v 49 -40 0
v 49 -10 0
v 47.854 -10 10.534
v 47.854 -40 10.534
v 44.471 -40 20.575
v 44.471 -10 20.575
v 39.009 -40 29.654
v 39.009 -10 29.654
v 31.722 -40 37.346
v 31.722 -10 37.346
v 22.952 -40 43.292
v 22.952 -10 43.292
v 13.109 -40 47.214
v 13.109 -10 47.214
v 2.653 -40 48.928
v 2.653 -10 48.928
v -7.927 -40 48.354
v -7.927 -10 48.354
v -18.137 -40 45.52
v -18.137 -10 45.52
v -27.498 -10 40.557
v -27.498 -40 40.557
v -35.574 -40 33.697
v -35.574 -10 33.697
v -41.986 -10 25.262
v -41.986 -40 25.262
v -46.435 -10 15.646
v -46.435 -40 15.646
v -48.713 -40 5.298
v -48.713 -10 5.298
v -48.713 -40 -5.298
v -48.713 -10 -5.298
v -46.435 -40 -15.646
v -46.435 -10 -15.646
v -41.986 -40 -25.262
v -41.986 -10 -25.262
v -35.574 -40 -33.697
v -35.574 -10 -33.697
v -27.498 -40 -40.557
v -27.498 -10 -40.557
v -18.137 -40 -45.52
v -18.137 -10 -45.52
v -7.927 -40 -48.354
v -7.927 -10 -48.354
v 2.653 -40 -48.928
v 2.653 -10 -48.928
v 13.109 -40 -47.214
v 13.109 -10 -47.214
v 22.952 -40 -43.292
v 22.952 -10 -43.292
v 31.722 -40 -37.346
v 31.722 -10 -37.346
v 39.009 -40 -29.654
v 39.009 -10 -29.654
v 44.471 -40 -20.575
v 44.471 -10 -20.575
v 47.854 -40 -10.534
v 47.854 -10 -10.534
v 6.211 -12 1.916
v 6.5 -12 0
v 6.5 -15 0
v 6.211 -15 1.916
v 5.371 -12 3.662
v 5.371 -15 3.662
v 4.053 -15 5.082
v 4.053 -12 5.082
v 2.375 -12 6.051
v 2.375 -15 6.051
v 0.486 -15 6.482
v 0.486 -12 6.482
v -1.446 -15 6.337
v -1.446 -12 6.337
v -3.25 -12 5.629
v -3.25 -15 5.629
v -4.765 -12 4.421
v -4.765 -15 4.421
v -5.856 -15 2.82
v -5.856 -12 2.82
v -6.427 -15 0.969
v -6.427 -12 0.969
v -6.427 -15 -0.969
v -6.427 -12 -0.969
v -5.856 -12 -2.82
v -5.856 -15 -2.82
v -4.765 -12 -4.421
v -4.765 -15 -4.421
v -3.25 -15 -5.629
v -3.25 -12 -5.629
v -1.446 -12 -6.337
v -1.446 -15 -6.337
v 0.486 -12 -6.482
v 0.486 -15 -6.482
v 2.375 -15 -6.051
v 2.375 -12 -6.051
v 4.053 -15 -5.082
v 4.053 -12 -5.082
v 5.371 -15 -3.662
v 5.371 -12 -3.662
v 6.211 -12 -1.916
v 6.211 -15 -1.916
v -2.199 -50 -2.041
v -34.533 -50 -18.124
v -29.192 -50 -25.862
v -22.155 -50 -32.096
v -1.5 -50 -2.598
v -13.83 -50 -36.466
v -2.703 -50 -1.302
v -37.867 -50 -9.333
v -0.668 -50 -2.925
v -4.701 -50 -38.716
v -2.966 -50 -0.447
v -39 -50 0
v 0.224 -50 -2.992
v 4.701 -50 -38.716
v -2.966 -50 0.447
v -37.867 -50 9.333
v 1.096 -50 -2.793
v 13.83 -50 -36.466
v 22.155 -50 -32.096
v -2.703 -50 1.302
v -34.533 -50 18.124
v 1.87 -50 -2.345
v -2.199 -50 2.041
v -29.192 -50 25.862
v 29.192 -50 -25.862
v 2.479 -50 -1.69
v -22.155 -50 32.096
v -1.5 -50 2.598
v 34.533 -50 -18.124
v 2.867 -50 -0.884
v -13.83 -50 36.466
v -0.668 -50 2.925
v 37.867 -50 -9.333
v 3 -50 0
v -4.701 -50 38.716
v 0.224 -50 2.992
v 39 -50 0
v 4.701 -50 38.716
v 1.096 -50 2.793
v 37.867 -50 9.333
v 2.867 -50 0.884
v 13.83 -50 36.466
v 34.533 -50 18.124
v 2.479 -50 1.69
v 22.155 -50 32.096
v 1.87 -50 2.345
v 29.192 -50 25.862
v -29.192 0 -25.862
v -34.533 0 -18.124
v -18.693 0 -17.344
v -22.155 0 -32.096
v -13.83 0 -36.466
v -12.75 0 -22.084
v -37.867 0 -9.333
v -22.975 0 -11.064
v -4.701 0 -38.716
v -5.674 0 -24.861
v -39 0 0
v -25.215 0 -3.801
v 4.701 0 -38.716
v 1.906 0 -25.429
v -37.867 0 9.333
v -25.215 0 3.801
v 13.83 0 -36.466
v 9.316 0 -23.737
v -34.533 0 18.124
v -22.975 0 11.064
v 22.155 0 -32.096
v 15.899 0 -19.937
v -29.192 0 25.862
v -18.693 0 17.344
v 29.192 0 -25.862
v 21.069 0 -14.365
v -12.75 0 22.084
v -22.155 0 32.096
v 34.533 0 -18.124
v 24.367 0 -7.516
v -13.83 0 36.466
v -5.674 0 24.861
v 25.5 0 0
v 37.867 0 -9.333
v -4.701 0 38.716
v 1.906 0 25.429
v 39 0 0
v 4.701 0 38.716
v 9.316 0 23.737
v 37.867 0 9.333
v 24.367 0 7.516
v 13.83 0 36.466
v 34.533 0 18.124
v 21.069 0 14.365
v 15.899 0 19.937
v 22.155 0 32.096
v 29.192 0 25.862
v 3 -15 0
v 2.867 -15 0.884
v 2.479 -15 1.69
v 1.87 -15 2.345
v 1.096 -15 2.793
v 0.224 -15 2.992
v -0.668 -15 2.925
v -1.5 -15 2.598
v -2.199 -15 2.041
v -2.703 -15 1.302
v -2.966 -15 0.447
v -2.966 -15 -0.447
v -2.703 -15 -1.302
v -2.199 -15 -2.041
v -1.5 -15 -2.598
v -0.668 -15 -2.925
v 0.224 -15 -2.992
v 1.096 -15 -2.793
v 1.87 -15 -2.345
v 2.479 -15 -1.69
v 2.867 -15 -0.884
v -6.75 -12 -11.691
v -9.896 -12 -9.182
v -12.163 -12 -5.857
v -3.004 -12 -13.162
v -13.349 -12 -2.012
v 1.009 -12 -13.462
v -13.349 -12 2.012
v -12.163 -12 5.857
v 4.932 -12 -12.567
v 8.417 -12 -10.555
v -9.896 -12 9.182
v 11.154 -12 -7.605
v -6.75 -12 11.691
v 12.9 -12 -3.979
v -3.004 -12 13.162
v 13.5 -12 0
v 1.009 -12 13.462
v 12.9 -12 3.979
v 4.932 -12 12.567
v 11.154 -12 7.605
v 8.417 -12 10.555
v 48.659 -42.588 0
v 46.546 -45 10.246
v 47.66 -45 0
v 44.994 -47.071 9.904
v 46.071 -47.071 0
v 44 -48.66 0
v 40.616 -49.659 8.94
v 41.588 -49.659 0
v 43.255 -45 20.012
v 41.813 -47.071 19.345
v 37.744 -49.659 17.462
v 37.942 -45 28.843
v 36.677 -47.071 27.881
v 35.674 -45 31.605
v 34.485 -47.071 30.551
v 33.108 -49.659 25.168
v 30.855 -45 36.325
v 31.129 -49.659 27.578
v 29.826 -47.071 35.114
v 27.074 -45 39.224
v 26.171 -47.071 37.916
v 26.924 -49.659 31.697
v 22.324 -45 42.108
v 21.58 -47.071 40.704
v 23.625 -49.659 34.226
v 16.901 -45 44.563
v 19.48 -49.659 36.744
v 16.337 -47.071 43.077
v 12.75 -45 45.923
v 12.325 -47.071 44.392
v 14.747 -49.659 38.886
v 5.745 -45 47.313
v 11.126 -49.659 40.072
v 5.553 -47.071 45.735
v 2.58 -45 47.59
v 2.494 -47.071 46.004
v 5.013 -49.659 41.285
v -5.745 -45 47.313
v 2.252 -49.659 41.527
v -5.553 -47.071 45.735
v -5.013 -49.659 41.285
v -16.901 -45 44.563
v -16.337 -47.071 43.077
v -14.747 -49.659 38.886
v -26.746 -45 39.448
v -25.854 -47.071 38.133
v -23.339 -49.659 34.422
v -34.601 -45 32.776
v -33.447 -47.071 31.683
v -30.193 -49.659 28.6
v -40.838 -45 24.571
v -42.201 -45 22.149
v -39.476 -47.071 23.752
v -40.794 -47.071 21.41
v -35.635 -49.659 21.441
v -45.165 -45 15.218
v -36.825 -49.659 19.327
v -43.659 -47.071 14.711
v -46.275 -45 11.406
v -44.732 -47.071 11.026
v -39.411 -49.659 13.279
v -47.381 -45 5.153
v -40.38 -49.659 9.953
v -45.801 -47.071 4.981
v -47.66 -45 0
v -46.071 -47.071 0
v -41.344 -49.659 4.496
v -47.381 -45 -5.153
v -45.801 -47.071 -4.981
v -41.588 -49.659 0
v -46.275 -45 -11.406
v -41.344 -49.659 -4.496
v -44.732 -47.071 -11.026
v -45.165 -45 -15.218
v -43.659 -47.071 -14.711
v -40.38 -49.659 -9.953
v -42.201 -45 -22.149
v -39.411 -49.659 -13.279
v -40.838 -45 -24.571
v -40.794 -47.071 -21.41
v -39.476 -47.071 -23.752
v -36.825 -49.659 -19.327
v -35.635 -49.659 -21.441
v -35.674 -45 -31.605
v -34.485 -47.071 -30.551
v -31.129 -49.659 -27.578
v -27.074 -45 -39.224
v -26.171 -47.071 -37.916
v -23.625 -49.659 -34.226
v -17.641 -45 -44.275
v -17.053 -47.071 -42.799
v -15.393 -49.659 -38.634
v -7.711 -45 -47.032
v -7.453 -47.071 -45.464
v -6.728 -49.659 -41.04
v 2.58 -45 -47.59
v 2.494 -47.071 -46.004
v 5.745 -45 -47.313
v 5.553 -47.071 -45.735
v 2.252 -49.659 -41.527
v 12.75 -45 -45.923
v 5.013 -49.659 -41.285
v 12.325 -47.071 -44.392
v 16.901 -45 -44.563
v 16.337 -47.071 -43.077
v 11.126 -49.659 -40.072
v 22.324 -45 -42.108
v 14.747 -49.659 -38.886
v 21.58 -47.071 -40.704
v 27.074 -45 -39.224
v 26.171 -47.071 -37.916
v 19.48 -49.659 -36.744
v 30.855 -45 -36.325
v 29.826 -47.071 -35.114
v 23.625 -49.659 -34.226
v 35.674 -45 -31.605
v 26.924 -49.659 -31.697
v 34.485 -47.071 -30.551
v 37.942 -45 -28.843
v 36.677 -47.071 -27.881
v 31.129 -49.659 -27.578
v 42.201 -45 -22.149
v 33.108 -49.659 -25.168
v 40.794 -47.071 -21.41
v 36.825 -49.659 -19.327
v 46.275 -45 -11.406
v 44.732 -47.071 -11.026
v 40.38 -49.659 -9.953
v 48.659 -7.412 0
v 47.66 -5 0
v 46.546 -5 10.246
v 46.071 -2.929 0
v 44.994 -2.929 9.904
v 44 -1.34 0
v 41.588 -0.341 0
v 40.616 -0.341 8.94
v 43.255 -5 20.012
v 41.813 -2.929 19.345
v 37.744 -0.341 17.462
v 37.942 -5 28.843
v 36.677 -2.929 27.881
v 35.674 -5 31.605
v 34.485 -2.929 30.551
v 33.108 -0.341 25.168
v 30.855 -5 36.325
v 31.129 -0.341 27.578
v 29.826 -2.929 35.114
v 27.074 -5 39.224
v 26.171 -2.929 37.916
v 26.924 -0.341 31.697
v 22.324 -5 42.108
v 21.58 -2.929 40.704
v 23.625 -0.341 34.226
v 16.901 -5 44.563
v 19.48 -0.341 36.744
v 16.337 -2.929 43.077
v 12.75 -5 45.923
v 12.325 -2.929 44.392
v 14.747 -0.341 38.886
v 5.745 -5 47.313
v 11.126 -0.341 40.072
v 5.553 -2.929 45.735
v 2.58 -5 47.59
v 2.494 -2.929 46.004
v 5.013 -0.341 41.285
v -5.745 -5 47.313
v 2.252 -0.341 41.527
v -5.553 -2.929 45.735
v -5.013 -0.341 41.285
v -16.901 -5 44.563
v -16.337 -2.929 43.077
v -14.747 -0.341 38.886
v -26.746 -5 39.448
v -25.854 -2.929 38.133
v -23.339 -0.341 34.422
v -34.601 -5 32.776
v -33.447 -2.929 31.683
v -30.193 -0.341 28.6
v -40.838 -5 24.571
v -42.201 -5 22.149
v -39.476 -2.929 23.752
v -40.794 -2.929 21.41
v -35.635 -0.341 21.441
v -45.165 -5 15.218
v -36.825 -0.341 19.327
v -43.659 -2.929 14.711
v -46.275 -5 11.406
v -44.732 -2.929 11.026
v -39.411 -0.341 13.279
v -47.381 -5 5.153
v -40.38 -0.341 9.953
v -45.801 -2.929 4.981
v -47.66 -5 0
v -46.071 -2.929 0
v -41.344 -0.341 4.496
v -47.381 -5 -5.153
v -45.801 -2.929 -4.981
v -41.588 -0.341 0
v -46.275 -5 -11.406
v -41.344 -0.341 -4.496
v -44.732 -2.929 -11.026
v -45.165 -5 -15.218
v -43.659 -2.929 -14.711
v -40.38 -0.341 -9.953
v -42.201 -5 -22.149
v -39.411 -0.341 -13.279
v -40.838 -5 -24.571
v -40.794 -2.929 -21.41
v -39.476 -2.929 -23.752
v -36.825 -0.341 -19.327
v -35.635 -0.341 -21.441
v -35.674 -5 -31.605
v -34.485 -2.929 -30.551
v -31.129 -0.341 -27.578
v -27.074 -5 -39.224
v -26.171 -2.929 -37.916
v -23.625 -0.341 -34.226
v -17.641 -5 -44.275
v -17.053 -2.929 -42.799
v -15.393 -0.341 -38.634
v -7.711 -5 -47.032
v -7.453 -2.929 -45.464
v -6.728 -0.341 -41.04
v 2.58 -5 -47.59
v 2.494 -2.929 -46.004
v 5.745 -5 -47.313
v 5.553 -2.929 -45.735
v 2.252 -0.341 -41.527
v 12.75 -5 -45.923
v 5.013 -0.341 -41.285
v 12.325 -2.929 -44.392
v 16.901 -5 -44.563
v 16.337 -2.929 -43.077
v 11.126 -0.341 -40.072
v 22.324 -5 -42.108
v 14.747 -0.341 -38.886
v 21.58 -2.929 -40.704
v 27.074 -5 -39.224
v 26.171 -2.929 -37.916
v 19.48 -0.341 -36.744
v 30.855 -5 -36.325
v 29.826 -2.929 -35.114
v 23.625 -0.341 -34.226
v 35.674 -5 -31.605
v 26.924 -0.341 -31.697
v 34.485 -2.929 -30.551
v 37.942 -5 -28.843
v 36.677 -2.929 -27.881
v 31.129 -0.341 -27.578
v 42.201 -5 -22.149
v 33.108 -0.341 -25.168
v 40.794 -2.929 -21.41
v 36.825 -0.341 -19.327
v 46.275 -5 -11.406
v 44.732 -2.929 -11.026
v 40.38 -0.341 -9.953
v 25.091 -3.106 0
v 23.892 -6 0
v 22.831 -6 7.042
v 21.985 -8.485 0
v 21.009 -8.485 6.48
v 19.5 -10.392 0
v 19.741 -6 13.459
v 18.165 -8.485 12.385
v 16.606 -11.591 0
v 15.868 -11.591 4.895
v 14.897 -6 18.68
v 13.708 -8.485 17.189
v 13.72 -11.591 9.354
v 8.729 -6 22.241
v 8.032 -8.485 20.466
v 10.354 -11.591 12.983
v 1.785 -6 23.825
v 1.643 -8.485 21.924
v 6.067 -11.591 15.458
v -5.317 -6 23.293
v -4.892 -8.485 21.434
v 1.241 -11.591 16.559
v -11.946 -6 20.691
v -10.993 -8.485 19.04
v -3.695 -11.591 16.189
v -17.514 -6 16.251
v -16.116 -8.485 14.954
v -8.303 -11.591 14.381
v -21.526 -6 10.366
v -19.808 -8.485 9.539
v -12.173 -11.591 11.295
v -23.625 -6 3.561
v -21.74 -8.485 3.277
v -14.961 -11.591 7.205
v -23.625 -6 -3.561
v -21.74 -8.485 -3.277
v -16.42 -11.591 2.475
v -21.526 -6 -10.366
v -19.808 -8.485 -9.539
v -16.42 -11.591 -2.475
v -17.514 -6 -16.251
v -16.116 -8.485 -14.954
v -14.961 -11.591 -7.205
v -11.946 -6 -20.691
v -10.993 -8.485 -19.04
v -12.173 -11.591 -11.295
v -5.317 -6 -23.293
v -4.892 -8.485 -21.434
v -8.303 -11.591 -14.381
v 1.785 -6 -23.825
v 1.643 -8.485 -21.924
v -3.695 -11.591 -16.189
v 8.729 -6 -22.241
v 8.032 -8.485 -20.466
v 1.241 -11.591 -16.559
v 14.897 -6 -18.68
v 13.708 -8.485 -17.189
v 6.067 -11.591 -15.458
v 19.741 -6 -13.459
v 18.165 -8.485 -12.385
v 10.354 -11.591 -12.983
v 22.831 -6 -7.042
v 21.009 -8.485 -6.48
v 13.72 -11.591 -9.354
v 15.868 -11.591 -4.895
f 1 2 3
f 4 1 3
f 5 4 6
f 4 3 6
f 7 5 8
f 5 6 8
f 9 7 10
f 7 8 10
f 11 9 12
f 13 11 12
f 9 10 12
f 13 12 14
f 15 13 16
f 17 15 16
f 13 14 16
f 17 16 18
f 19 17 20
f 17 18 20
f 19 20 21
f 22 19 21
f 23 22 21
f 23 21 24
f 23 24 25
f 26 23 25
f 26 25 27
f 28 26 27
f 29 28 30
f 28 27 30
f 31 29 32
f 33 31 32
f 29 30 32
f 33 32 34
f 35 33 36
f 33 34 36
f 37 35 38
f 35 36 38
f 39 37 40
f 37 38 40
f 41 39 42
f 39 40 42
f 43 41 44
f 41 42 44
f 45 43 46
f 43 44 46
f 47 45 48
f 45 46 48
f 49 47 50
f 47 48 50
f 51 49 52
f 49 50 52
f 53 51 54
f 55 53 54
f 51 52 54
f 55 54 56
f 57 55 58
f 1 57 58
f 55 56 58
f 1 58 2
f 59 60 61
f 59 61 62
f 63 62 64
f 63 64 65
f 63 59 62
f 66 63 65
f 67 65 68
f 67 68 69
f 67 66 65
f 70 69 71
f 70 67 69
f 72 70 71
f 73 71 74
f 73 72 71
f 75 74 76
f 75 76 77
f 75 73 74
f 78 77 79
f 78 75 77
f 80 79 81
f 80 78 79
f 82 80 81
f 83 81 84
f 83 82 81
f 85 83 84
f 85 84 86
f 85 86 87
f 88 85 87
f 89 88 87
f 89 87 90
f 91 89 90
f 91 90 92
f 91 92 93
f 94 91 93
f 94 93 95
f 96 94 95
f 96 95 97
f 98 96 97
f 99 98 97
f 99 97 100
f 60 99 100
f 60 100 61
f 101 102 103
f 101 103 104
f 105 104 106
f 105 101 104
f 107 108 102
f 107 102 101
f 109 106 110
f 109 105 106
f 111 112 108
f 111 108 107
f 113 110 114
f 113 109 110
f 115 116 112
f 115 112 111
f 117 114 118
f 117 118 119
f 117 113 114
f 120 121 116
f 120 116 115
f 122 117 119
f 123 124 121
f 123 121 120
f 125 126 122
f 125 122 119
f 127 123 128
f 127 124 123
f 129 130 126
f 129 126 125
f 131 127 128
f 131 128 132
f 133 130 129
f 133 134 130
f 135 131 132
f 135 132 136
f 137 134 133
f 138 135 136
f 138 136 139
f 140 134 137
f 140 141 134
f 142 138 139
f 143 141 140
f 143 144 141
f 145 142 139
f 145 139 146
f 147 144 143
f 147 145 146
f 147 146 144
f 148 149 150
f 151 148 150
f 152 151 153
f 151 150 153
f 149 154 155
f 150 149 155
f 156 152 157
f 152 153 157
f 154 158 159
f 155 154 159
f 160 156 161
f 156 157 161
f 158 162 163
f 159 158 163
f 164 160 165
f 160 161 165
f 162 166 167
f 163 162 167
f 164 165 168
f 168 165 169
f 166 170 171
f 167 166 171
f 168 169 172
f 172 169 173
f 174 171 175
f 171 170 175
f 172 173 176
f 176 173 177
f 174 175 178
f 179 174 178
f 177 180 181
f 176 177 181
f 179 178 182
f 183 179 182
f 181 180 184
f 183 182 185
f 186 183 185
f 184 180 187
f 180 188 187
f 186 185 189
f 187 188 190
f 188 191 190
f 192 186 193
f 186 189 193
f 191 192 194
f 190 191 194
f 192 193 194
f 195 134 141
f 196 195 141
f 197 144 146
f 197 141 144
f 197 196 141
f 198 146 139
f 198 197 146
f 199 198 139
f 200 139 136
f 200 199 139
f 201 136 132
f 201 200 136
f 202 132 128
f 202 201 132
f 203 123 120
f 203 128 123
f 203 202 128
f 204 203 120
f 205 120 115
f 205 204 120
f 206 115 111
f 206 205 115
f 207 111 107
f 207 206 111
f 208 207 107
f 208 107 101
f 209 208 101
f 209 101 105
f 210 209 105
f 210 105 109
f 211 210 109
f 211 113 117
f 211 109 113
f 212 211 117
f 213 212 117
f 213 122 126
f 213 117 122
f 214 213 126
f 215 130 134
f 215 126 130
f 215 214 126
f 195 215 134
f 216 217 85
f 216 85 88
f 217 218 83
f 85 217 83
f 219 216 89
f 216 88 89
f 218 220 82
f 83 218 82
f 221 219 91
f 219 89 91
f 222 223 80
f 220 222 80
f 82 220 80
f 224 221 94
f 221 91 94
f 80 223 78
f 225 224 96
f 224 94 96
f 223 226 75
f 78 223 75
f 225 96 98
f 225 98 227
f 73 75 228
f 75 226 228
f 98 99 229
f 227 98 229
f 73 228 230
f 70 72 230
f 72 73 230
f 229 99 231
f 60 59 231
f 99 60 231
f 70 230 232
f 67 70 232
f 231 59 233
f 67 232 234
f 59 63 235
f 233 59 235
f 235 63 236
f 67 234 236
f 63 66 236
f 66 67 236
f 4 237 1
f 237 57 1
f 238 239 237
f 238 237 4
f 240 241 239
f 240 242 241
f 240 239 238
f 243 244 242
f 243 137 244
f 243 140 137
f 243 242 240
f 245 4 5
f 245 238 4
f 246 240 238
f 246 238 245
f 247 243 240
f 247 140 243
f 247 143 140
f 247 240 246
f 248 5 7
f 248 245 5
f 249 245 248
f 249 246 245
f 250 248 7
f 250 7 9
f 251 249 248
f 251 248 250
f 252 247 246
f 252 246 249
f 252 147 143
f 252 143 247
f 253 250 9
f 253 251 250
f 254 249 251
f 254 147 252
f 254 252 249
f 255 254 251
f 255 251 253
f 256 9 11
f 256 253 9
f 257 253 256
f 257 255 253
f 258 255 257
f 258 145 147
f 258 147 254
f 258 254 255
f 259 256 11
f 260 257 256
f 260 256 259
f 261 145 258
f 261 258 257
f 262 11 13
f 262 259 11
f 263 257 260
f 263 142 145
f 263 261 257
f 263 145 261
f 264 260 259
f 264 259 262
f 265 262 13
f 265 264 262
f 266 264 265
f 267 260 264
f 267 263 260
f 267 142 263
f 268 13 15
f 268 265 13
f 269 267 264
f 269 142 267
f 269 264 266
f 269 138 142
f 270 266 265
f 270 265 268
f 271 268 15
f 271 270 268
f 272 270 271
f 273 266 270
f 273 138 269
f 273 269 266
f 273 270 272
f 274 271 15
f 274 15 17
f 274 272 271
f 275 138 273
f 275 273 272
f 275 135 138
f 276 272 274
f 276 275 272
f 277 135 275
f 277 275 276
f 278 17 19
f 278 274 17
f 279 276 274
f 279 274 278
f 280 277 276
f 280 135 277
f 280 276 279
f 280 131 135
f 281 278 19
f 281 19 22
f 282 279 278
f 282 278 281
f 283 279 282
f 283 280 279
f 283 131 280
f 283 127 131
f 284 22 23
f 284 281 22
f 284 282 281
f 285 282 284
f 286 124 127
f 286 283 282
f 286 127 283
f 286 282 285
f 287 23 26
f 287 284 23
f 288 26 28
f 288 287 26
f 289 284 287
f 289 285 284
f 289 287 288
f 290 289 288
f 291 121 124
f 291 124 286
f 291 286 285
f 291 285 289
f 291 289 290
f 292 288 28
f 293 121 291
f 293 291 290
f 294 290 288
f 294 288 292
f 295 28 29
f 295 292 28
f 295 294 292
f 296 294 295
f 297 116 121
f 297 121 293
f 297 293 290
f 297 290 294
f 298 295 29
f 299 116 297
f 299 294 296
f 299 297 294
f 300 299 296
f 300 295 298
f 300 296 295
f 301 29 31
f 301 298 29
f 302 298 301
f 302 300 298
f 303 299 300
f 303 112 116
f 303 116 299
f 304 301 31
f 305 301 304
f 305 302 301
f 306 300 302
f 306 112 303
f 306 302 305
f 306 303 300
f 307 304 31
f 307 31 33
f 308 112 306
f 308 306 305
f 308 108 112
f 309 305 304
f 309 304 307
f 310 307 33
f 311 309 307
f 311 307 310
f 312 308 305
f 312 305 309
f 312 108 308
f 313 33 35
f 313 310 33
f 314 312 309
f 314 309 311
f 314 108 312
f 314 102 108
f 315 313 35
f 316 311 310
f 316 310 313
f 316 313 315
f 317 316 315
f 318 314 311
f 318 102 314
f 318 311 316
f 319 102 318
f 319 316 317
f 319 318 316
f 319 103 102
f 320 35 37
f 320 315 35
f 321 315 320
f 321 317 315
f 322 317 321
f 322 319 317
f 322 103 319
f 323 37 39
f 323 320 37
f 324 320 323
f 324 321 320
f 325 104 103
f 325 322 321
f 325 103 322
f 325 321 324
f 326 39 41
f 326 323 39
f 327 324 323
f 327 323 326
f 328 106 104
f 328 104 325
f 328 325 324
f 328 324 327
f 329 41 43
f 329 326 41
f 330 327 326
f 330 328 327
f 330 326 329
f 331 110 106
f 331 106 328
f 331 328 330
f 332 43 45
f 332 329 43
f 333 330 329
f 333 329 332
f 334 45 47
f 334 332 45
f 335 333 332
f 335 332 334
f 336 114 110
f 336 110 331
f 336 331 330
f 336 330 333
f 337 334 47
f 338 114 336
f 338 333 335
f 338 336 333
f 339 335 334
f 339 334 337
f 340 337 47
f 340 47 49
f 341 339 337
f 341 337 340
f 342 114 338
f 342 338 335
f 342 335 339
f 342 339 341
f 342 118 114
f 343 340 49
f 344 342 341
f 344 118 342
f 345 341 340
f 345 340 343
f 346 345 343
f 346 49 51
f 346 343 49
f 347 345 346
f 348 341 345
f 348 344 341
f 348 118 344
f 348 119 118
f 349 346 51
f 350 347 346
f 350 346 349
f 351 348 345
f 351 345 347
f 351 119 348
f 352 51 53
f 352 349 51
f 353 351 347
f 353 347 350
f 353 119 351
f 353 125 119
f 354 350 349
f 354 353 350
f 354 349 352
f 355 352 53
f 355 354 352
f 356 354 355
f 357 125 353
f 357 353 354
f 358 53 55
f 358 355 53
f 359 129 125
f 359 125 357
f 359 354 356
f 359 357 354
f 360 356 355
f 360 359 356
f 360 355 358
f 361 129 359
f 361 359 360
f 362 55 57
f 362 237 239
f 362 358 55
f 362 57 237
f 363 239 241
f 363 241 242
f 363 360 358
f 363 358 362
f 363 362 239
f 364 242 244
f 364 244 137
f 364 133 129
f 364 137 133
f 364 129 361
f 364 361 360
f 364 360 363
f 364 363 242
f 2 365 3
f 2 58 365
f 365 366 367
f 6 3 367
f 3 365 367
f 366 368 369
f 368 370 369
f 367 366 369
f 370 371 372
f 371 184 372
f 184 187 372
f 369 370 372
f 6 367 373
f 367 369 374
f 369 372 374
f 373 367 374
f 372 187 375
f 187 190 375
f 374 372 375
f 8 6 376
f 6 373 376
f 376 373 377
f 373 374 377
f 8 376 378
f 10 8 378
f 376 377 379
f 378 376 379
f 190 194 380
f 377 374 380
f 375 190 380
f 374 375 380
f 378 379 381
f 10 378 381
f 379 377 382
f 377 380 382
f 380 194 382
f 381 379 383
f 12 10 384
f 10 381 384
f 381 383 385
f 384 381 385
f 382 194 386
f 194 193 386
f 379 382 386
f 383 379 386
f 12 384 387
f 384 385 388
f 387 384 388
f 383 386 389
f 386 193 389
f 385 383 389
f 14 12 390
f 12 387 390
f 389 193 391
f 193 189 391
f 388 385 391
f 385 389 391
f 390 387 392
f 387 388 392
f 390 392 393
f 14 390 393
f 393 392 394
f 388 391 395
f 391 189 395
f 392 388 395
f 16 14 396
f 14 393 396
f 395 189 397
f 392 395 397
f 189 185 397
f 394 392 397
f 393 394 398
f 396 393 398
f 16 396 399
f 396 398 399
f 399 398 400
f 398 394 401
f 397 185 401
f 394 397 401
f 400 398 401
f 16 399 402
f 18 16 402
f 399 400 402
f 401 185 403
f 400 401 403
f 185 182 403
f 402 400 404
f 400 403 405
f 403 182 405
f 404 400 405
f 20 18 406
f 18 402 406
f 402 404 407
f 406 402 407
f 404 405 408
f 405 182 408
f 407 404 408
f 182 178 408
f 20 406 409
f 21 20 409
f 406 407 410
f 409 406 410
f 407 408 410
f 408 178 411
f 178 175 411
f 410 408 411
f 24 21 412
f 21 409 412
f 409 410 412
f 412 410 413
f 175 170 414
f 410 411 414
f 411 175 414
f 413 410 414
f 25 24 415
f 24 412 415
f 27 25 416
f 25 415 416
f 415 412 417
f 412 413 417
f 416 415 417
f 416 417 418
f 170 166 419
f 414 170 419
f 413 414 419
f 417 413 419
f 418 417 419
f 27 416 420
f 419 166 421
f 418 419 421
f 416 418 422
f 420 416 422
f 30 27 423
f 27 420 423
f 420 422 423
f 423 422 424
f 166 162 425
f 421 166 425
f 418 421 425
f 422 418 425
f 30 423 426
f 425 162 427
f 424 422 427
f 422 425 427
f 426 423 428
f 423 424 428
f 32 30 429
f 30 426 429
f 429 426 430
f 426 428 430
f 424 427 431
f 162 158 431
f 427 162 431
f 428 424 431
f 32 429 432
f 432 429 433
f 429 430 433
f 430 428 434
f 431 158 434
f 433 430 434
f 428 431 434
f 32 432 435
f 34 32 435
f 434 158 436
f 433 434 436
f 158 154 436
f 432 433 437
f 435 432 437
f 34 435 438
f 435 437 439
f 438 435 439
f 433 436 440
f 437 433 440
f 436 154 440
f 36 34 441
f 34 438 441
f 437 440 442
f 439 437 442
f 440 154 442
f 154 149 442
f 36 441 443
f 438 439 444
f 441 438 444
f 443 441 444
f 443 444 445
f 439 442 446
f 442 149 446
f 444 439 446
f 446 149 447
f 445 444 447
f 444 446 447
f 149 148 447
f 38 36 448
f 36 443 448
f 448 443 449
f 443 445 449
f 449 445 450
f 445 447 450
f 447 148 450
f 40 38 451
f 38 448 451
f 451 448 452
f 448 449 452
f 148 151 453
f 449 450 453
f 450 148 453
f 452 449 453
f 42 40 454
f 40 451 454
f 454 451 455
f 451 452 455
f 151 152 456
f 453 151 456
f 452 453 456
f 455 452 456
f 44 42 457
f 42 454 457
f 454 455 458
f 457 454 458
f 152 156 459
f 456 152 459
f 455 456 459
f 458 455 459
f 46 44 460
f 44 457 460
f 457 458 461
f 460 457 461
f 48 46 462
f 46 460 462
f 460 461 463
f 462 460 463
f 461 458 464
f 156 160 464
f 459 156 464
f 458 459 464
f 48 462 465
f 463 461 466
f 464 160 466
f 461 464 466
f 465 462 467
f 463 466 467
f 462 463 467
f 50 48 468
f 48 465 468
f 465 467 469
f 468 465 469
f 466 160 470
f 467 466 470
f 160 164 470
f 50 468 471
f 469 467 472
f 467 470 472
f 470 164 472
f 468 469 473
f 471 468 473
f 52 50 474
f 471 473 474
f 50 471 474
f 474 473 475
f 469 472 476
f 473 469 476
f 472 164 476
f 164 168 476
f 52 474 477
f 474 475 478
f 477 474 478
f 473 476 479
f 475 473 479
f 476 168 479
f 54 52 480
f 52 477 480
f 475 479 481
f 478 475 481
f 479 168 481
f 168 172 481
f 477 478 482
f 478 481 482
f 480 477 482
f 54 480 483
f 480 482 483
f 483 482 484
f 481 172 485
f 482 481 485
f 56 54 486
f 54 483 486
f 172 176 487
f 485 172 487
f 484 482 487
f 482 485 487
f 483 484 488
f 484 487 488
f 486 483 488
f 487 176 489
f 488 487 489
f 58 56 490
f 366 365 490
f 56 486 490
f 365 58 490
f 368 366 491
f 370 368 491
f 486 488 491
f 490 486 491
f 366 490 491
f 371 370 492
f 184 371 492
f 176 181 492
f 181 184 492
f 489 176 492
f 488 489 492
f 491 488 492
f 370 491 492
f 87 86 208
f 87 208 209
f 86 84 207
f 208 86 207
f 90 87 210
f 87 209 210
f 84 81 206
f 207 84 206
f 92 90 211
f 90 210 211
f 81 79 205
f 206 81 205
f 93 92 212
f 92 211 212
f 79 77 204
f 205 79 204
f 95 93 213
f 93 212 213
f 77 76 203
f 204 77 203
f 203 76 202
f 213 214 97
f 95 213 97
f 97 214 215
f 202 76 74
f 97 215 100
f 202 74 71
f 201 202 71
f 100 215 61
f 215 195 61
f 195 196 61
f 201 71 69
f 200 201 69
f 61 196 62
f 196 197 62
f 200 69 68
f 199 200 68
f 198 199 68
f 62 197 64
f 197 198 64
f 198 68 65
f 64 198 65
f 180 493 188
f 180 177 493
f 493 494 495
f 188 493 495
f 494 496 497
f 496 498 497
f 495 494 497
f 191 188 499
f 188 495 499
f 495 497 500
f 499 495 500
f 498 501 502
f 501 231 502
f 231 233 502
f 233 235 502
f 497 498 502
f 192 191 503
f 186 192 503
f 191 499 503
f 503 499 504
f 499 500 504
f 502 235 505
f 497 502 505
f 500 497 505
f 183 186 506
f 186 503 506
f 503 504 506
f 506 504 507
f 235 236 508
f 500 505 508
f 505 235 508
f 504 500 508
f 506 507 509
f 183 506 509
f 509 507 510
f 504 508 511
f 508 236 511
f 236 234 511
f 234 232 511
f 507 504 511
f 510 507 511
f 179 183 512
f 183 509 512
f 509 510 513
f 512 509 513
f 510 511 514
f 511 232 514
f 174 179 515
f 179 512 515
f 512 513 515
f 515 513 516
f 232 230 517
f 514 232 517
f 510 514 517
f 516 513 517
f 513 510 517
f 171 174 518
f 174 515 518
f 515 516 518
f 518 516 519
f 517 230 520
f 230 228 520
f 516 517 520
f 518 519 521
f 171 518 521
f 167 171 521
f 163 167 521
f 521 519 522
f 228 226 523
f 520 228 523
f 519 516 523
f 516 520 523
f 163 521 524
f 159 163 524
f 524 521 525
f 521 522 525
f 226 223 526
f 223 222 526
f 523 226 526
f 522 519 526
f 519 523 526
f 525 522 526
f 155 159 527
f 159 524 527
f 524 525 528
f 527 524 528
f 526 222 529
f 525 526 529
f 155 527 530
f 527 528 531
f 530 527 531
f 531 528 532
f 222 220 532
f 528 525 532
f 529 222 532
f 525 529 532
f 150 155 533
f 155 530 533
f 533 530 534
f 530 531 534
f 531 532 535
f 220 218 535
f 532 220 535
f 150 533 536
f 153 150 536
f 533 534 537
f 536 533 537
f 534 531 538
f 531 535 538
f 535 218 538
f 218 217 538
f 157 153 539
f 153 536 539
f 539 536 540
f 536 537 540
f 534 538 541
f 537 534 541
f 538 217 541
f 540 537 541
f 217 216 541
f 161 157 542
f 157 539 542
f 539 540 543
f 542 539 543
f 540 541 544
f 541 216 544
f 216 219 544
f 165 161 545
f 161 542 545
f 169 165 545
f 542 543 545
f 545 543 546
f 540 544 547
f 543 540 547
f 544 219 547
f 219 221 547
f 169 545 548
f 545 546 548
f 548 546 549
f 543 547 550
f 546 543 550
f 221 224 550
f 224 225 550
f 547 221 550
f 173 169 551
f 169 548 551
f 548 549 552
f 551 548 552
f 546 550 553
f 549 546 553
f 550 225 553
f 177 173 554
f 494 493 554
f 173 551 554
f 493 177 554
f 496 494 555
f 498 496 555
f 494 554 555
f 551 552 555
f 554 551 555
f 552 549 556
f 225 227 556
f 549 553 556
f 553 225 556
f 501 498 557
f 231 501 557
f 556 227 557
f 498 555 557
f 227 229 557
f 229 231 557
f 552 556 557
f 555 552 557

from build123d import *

# Parameters (mm, degrees)
F0_R     = 49
F1_DEPTH = 50
F2_R     = 10
F4_R     = 25.5
F4_R_2   = 6.5
F5_DEPTH = 12
F6_DEPTH = 15
F7_R     = 11.99999
F4_R_3   = 3
F8_DEPTH = 50.001


# Not quite as in the source:
# - a fillet or chamfer is up to 0.001 mm smaller than in the source, because OpenCascade refuses the exact size


with BuildPart() as f1:
    # F0 (on Front) → F1 (new body)
    with BuildSketch(Plane.XZ):
        Circle(F0_R)
    extrude(amount=F1_DEPTH)

    # F2
    f2_edges = [f1.edges().sort_by_distance(p)[0] for p in [
        (-49, -50, 0),
        (-49, 0, 0),
    ]]
    fillet(f2_edges, radius=F2_R)

    # F4 (on Front) → F5 (cut)
    with BuildSketch(Plane.XZ):
        Circle(F4_R)
        Circle(F4_R_2, mode=Mode.SUBTRACT)
    extrude(amount=F5_DEPTH, mode=Mode.SUBTRACT)

    # F6 (cut): a face of the model
    f6_faces = [f1.faces().sort_by_distance(p)[0] for p in [
        (0, 0, 0),
    ]]
    extrude(f6_faces, amount=-F6_DEPTH, mode=Mode.SUBTRACT)

    # F7 (radius 12 in the source; OpenCascade refuses exactly that, so slightly less here)
    f7_edges = [f1.edges().sort_by_distance(p)[0] for p in [
        (-25.5, -12, 0),
    ]]
    fillet(f7_edges, radius=F7_R)

    # F4 (on Front) → F8 (cut, through all)
    with BuildSketch(Plane.XZ):
        Circle(F4_R_3)
    extrude(amount=F8_DEPTH, mode=Mode.SUBTRACT)


solid = f1.part
